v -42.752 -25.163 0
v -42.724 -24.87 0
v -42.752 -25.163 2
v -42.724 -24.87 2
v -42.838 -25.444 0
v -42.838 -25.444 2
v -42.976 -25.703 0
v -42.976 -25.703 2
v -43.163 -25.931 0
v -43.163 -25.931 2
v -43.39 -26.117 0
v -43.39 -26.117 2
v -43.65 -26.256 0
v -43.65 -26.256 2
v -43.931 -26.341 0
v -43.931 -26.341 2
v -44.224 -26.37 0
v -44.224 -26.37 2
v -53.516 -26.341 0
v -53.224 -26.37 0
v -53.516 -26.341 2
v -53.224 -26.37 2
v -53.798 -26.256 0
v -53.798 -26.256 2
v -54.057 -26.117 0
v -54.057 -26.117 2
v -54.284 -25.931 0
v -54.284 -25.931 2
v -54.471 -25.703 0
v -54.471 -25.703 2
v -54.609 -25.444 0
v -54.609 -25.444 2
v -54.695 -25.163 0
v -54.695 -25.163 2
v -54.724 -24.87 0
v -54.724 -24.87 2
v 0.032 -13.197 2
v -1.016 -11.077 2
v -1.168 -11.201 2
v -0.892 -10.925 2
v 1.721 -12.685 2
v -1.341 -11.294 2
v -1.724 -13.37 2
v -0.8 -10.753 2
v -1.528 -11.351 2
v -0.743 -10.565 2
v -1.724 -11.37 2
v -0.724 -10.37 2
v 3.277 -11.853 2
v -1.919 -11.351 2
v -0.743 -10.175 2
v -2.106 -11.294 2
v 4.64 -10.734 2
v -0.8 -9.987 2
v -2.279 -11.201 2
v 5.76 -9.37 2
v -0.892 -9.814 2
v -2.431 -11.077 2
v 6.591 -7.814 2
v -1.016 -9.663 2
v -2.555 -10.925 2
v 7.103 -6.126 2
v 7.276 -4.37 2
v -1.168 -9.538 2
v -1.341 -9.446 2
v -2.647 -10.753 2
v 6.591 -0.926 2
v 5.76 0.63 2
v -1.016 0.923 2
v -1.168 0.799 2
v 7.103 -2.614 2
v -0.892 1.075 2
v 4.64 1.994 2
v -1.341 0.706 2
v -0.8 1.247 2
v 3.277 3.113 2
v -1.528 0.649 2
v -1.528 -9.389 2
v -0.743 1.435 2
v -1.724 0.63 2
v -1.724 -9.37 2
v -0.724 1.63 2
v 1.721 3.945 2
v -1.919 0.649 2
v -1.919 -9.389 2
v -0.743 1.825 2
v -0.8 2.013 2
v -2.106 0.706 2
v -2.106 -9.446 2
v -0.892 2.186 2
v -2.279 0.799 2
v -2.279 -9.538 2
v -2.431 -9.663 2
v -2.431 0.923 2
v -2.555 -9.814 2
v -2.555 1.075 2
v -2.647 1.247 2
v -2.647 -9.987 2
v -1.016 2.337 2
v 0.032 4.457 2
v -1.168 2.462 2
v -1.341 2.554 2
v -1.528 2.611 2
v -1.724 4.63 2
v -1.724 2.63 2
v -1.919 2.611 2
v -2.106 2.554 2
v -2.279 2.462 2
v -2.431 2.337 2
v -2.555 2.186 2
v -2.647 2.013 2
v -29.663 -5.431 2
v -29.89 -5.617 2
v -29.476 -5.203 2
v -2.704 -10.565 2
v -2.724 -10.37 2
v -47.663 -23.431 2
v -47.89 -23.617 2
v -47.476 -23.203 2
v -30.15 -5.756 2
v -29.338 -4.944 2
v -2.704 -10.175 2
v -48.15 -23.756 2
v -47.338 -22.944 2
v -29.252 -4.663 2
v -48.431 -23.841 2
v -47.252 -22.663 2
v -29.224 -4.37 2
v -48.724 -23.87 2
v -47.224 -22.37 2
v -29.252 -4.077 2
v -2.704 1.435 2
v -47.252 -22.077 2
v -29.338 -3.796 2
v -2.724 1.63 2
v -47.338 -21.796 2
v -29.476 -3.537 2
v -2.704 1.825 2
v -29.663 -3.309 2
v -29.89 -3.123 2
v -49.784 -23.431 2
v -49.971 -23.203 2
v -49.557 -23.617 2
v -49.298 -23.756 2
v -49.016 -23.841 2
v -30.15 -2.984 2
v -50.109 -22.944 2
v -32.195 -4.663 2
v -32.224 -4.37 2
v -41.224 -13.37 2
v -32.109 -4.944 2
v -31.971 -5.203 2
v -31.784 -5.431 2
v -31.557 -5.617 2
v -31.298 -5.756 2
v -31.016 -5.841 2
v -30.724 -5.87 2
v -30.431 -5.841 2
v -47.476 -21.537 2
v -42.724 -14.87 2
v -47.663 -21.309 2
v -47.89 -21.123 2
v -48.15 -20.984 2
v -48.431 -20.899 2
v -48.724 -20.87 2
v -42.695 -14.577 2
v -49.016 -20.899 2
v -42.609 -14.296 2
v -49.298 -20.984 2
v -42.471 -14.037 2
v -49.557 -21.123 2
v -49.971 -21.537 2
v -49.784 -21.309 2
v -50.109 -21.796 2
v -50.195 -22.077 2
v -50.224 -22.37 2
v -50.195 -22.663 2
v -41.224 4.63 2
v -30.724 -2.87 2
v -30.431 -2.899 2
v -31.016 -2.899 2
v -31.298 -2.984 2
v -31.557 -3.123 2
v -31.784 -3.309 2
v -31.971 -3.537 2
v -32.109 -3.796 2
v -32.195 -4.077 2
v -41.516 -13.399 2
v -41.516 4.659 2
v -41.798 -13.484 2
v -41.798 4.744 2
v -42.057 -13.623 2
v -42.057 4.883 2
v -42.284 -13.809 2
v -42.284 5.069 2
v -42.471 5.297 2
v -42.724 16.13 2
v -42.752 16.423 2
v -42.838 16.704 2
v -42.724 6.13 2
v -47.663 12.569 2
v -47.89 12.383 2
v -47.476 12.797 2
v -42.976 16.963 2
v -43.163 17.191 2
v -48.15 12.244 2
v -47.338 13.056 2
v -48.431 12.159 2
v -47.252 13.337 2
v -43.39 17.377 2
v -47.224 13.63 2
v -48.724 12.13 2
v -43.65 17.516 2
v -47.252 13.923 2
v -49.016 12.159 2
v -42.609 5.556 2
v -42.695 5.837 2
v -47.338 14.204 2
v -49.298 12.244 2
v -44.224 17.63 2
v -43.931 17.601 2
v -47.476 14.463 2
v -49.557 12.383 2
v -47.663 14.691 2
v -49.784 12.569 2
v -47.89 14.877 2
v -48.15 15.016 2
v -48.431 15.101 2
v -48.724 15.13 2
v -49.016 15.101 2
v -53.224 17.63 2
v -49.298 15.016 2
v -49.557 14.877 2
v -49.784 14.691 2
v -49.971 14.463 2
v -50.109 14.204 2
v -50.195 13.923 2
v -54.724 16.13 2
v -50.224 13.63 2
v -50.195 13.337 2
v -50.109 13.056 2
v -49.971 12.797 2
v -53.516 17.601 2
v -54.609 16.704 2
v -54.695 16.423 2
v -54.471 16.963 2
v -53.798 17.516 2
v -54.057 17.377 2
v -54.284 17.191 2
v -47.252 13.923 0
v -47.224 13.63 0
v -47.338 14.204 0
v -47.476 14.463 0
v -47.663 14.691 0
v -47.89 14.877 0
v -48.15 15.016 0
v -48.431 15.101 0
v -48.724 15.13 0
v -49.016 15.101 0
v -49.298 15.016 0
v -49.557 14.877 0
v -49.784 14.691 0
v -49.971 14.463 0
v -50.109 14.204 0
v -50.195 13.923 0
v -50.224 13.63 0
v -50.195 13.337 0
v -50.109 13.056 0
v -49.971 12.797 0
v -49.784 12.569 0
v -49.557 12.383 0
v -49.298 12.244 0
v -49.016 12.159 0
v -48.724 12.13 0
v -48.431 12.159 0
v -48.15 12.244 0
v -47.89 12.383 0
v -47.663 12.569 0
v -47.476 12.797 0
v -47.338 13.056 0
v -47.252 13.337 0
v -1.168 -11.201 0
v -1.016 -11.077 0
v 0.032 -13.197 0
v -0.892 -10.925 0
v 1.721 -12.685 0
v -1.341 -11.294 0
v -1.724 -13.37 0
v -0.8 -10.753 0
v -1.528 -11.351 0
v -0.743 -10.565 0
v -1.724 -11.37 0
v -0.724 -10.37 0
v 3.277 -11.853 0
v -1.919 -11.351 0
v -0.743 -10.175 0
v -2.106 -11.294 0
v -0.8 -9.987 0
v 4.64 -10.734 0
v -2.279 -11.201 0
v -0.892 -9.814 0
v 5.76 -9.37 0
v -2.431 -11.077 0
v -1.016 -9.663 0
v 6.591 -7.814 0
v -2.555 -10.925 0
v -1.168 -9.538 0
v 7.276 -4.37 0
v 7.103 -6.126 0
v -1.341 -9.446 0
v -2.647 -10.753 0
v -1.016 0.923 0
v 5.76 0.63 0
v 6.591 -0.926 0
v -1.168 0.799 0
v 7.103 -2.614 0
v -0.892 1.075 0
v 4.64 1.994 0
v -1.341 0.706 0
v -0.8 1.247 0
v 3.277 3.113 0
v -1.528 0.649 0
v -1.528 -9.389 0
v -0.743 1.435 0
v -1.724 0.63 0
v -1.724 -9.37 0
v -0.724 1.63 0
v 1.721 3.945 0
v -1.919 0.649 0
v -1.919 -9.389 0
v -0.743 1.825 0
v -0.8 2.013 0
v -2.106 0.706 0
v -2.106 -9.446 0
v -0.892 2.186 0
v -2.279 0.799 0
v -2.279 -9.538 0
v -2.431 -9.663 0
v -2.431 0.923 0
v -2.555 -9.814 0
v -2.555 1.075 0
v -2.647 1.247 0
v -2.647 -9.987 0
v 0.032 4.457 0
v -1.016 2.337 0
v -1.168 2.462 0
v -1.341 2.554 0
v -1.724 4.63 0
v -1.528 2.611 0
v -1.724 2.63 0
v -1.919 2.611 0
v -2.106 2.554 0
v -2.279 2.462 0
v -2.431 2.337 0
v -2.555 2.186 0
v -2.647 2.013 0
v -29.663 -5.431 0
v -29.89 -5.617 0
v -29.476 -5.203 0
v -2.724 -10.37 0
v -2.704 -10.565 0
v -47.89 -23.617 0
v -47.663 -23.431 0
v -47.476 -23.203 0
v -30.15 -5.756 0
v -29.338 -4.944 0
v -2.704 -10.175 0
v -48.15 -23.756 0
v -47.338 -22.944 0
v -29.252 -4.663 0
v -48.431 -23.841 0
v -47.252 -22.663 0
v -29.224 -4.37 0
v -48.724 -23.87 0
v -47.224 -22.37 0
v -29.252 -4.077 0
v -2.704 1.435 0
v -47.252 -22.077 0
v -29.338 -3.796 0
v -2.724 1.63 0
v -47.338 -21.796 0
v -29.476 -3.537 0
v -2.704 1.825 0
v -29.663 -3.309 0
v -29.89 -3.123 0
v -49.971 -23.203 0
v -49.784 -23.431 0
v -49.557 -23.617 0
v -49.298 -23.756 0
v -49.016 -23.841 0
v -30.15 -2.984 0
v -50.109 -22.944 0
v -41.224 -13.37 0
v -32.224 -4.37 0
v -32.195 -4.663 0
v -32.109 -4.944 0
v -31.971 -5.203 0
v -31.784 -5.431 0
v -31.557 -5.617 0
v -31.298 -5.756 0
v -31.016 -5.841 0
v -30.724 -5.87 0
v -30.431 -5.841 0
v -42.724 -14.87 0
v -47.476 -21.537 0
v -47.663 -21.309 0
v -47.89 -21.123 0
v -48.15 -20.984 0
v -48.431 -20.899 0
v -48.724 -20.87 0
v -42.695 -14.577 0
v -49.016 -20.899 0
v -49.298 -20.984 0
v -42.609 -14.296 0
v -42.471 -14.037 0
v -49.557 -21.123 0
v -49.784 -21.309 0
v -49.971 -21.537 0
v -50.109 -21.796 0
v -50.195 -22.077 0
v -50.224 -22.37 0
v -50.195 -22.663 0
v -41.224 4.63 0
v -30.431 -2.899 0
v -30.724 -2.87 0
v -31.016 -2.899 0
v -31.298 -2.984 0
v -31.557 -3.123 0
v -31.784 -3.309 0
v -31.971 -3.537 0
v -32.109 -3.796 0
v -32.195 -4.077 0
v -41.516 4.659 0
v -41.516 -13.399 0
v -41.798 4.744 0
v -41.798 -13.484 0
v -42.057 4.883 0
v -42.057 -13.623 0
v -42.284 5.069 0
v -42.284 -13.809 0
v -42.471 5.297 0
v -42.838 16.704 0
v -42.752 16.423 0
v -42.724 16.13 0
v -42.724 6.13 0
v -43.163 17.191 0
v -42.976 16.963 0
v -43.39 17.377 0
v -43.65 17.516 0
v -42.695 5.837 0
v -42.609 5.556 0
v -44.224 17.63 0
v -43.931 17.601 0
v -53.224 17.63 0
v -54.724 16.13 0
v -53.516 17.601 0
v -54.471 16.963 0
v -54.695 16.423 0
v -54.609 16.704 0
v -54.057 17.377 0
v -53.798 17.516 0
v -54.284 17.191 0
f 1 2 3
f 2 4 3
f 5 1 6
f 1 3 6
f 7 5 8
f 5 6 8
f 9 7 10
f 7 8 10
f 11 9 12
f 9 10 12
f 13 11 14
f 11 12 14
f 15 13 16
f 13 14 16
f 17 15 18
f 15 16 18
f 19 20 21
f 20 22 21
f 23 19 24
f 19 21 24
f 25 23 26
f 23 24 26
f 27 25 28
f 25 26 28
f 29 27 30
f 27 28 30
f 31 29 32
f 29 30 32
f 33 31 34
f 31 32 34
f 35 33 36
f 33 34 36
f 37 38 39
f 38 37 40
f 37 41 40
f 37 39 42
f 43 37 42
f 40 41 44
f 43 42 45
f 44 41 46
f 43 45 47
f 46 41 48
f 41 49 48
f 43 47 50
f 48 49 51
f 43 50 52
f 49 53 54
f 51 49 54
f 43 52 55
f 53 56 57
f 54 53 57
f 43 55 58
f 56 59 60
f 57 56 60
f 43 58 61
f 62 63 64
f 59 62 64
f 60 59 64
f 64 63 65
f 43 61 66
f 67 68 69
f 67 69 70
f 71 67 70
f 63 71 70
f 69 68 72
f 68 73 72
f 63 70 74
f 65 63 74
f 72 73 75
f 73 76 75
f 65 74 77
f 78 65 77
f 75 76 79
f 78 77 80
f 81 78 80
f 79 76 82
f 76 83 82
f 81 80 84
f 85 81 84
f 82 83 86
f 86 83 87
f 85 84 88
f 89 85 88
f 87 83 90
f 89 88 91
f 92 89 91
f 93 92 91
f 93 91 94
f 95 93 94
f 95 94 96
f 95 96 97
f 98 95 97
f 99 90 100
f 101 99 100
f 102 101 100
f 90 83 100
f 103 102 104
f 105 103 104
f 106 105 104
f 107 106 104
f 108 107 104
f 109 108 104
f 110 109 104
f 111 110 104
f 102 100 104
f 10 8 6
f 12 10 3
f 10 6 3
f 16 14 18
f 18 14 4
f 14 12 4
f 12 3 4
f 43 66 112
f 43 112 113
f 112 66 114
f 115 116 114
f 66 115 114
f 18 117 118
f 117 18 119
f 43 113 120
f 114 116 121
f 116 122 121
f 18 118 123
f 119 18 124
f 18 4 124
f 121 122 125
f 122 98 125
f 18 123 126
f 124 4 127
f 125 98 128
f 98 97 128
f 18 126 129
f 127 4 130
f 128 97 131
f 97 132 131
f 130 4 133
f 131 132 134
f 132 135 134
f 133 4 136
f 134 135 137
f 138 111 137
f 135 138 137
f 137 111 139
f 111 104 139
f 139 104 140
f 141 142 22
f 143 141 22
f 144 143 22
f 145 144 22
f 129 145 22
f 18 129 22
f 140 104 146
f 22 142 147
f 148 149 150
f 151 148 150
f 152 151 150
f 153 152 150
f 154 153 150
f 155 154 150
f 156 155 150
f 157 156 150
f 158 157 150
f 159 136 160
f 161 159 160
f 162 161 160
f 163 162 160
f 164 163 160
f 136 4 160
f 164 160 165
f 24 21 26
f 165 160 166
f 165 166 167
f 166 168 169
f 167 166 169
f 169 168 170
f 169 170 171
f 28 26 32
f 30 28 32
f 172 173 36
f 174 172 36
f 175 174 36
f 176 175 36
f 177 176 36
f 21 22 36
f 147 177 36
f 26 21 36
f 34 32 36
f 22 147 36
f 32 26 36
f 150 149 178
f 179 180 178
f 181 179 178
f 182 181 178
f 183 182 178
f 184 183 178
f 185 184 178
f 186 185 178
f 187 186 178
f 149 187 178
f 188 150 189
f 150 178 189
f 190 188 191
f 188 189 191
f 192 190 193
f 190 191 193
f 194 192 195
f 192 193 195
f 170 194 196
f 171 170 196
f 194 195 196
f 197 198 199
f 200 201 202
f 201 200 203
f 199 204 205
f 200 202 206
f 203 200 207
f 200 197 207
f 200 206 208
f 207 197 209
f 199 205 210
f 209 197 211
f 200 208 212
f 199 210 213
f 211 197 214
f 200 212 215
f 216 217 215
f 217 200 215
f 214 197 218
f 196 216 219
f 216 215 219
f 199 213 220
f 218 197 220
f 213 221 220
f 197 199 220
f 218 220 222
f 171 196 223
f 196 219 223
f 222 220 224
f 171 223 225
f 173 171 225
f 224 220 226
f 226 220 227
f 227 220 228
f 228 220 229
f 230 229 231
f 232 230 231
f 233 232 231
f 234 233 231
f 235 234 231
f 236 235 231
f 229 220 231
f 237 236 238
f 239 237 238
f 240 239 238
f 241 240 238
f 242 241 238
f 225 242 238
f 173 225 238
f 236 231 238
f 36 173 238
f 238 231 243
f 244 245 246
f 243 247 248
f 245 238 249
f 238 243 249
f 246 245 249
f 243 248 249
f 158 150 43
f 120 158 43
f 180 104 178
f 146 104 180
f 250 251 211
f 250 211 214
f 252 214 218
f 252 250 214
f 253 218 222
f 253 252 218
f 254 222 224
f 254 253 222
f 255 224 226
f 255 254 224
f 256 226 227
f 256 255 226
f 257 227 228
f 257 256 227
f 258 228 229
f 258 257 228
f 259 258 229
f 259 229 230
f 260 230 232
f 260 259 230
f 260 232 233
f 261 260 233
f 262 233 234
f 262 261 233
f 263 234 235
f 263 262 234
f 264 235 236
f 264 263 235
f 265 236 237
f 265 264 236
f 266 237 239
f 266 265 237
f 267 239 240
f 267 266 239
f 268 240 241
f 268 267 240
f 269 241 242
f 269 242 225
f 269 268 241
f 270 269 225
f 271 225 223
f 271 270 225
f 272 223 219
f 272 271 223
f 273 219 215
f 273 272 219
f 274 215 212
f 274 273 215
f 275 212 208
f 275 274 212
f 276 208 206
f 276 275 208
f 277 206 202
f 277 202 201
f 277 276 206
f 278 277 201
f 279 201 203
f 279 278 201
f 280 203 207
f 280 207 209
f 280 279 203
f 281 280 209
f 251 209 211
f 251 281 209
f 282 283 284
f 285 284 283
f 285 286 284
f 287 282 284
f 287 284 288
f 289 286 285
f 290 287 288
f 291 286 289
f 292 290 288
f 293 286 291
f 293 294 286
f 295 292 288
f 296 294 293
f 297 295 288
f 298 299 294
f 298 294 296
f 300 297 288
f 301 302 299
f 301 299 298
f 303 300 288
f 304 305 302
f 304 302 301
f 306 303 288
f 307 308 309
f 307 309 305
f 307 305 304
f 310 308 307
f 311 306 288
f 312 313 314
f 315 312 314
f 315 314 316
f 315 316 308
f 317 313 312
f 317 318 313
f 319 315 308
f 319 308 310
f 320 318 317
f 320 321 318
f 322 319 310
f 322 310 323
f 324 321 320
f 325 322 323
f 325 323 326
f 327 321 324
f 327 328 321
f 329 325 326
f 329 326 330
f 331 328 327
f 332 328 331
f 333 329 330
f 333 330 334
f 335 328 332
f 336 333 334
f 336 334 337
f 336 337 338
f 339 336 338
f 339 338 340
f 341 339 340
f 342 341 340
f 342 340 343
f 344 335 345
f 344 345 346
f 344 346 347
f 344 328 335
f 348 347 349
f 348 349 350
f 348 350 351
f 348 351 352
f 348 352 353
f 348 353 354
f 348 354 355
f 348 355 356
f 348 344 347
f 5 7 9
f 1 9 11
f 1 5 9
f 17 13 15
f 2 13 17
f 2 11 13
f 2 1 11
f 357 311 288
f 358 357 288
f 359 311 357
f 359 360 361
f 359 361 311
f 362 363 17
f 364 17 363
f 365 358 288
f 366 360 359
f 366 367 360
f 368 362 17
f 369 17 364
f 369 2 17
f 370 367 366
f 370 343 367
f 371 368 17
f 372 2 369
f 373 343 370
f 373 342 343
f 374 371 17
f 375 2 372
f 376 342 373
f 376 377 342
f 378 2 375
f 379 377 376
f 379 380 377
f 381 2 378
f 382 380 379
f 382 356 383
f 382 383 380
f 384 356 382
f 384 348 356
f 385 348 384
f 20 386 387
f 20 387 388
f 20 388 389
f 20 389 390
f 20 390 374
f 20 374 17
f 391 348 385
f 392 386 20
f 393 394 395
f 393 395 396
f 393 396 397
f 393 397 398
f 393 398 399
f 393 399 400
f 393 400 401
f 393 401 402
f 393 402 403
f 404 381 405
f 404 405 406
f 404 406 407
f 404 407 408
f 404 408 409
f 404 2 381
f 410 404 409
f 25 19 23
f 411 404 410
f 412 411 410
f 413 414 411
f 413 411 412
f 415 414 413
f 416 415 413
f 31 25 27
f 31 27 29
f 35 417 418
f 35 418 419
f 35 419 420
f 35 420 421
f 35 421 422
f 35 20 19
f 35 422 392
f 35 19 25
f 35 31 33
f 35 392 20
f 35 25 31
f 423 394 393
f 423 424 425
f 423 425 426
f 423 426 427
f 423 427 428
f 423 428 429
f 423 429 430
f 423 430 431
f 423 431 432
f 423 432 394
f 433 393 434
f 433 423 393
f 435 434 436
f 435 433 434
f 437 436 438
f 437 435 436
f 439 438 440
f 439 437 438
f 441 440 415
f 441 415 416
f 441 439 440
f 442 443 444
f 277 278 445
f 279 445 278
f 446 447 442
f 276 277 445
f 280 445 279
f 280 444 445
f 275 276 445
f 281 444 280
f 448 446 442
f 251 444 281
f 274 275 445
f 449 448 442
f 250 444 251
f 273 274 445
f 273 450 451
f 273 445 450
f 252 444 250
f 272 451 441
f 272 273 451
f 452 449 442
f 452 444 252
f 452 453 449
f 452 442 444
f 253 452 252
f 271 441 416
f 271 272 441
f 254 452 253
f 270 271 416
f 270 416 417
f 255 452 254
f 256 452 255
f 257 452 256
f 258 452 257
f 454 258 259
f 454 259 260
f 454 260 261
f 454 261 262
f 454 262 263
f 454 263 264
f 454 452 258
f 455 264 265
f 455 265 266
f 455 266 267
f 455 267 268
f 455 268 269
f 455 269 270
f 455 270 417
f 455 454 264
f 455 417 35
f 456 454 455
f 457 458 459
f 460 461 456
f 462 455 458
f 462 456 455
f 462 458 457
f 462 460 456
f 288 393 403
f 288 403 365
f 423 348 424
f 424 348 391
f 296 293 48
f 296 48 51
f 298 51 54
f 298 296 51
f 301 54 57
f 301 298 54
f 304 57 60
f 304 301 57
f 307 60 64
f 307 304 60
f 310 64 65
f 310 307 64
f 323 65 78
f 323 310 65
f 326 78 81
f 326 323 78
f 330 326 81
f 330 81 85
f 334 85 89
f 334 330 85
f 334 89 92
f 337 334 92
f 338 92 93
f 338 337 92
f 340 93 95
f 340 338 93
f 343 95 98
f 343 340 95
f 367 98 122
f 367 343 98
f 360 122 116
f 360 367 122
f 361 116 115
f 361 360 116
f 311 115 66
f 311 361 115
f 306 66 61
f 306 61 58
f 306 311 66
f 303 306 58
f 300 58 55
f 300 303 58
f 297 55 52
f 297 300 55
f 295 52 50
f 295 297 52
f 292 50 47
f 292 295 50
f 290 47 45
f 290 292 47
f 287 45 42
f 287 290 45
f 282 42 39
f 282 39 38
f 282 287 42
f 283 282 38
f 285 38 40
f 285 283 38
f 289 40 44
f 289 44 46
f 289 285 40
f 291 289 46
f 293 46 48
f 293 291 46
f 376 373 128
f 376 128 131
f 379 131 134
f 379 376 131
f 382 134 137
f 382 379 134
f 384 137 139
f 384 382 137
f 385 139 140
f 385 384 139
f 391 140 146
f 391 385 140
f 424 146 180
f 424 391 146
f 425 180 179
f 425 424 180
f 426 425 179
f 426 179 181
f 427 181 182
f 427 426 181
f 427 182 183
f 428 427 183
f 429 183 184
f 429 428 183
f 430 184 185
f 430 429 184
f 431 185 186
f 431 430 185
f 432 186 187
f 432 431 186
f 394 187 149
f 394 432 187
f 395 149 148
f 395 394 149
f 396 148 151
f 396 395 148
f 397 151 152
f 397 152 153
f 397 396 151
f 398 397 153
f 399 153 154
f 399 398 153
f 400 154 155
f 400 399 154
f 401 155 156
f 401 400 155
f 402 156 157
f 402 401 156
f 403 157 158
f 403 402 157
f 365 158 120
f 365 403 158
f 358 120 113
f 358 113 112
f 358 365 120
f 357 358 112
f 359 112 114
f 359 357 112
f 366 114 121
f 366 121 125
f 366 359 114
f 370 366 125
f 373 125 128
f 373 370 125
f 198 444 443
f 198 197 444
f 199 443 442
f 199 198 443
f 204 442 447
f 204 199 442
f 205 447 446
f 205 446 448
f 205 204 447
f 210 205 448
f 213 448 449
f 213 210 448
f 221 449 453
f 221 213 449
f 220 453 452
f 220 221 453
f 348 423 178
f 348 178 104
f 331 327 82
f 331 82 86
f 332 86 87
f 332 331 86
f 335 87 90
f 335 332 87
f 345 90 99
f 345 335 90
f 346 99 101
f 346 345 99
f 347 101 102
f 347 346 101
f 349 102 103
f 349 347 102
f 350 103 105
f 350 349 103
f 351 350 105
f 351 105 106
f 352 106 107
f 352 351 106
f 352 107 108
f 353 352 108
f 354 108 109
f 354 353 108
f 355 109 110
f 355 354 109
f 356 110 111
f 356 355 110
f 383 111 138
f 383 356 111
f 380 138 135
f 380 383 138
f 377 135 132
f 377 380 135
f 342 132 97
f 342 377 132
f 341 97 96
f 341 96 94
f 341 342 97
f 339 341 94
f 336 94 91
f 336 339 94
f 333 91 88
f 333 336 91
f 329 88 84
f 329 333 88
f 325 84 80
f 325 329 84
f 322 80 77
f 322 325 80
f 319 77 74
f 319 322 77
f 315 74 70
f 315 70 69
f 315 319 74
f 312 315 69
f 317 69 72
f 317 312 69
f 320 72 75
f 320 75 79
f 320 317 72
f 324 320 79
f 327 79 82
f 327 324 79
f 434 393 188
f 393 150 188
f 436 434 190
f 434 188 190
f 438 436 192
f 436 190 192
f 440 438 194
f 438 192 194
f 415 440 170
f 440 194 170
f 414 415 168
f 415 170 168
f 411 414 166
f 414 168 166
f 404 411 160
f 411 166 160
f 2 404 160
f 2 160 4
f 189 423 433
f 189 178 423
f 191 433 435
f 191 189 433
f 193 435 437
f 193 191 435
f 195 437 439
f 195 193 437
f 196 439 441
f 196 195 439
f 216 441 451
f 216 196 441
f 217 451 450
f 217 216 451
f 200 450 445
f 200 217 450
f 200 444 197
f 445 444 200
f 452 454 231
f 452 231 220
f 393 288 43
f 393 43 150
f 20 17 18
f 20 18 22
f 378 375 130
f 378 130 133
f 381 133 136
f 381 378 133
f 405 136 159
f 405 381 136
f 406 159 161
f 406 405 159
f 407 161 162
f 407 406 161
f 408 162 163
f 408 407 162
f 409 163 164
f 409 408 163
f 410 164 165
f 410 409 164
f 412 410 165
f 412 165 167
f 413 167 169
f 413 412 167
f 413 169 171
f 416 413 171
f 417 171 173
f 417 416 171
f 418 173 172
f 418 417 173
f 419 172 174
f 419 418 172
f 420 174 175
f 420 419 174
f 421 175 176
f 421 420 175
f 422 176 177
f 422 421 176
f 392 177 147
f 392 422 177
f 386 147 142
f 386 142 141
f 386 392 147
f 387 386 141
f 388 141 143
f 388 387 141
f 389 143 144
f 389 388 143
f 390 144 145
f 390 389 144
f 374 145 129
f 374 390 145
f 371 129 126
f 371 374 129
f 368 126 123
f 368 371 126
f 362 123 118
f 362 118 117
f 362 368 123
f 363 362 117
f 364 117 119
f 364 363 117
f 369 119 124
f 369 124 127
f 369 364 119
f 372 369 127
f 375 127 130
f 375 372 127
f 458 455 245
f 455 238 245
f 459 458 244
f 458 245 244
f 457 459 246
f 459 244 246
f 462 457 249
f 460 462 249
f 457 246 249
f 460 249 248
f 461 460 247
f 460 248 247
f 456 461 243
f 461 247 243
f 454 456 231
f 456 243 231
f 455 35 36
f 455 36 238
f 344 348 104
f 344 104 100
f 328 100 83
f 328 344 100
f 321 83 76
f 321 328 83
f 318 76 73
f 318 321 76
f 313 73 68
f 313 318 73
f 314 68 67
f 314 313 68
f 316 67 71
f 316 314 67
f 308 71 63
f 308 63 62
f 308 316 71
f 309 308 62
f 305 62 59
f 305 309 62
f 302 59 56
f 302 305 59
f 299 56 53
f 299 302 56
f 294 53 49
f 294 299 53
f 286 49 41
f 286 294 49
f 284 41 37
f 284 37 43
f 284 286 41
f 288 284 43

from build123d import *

# Parameters (mm, degrees)
SKETCH_1_R      = 1.5
SKETCH_1_R_2    = 1
EXTRUDE_1_DEPTH = 2
FILLET_1_R      = 1.5


with BuildPart() as part:
    # 草图1 → 凸台-拉伸1 (new body)
    with BuildSketch(Plane.XY):
        with BuildLine():
            Line((-1.723571429, -13.369911995), (-42.723571429, -13.369911995))
            Line((-42.723571429, -13.369911995), (-42.723571429, -26.369911995))
            Line((-42.723571429, -26.369911995), (-54.723571429, -26.369911995))
            Line((-54.723571429, -26.369911995), (-54.723571429, 17.630088005))
            Line((-54.723571429, 17.630088005), (-42.723571429, 17.630088005))
            Line((-42.723571429, 17.630088005), (-42.723571429, 4.630088005))
            Line((-42.723571429, 4.630088005), (-1.723571429, 4.630088005))
            ThreePointArc((-1.723571429, 4.630088005), (7.276428571, -4.369911995), (-1.723571429, -13.369911995))
        make_face()
        with Locations((-30.723571429, -4.369911995)):
            Circle(SKETCH_1_R, mode=Mode.SUBTRACT)
        with Locations((-48.723571429, 13.630088005)):
            Circle(SKETCH_1_R, mode=Mode.SUBTRACT)
        with Locations((-48.723571429, -22.369911995)):
            Circle(SKETCH_1_R, mode=Mode.SUBTRACT)
        with Locations((-1.723571429, 1.630088005)):
            Circle(SKETCH_1_R_2, mode=Mode.SUBTRACT)
        with Locations((-1.723571429, -10.369911995)):
            Circle(SKETCH_1_R_2, mode=Mode.SUBTRACT)
    extrude(amount=EXTRUDE_1_DEPTH)

    # 圆角1
    fillet_1_edges = [part.edges().sort_by_distance(p)[0] for p in [
        (-42.723571429, -13.369911995, 1),
        (-42.723571429, -26.369911995, 1),
        (-54.723571429, -26.369911995, 1),
        (-54.723571429, 17.630088005, 1),
        (-42.723571429, 17.630088005, 1),
        (-42.723571429, 4.630088005, 1),
    ]]
    fillet(fillet_1_edges, radius=FILLET_1_R)


solid = part.part
